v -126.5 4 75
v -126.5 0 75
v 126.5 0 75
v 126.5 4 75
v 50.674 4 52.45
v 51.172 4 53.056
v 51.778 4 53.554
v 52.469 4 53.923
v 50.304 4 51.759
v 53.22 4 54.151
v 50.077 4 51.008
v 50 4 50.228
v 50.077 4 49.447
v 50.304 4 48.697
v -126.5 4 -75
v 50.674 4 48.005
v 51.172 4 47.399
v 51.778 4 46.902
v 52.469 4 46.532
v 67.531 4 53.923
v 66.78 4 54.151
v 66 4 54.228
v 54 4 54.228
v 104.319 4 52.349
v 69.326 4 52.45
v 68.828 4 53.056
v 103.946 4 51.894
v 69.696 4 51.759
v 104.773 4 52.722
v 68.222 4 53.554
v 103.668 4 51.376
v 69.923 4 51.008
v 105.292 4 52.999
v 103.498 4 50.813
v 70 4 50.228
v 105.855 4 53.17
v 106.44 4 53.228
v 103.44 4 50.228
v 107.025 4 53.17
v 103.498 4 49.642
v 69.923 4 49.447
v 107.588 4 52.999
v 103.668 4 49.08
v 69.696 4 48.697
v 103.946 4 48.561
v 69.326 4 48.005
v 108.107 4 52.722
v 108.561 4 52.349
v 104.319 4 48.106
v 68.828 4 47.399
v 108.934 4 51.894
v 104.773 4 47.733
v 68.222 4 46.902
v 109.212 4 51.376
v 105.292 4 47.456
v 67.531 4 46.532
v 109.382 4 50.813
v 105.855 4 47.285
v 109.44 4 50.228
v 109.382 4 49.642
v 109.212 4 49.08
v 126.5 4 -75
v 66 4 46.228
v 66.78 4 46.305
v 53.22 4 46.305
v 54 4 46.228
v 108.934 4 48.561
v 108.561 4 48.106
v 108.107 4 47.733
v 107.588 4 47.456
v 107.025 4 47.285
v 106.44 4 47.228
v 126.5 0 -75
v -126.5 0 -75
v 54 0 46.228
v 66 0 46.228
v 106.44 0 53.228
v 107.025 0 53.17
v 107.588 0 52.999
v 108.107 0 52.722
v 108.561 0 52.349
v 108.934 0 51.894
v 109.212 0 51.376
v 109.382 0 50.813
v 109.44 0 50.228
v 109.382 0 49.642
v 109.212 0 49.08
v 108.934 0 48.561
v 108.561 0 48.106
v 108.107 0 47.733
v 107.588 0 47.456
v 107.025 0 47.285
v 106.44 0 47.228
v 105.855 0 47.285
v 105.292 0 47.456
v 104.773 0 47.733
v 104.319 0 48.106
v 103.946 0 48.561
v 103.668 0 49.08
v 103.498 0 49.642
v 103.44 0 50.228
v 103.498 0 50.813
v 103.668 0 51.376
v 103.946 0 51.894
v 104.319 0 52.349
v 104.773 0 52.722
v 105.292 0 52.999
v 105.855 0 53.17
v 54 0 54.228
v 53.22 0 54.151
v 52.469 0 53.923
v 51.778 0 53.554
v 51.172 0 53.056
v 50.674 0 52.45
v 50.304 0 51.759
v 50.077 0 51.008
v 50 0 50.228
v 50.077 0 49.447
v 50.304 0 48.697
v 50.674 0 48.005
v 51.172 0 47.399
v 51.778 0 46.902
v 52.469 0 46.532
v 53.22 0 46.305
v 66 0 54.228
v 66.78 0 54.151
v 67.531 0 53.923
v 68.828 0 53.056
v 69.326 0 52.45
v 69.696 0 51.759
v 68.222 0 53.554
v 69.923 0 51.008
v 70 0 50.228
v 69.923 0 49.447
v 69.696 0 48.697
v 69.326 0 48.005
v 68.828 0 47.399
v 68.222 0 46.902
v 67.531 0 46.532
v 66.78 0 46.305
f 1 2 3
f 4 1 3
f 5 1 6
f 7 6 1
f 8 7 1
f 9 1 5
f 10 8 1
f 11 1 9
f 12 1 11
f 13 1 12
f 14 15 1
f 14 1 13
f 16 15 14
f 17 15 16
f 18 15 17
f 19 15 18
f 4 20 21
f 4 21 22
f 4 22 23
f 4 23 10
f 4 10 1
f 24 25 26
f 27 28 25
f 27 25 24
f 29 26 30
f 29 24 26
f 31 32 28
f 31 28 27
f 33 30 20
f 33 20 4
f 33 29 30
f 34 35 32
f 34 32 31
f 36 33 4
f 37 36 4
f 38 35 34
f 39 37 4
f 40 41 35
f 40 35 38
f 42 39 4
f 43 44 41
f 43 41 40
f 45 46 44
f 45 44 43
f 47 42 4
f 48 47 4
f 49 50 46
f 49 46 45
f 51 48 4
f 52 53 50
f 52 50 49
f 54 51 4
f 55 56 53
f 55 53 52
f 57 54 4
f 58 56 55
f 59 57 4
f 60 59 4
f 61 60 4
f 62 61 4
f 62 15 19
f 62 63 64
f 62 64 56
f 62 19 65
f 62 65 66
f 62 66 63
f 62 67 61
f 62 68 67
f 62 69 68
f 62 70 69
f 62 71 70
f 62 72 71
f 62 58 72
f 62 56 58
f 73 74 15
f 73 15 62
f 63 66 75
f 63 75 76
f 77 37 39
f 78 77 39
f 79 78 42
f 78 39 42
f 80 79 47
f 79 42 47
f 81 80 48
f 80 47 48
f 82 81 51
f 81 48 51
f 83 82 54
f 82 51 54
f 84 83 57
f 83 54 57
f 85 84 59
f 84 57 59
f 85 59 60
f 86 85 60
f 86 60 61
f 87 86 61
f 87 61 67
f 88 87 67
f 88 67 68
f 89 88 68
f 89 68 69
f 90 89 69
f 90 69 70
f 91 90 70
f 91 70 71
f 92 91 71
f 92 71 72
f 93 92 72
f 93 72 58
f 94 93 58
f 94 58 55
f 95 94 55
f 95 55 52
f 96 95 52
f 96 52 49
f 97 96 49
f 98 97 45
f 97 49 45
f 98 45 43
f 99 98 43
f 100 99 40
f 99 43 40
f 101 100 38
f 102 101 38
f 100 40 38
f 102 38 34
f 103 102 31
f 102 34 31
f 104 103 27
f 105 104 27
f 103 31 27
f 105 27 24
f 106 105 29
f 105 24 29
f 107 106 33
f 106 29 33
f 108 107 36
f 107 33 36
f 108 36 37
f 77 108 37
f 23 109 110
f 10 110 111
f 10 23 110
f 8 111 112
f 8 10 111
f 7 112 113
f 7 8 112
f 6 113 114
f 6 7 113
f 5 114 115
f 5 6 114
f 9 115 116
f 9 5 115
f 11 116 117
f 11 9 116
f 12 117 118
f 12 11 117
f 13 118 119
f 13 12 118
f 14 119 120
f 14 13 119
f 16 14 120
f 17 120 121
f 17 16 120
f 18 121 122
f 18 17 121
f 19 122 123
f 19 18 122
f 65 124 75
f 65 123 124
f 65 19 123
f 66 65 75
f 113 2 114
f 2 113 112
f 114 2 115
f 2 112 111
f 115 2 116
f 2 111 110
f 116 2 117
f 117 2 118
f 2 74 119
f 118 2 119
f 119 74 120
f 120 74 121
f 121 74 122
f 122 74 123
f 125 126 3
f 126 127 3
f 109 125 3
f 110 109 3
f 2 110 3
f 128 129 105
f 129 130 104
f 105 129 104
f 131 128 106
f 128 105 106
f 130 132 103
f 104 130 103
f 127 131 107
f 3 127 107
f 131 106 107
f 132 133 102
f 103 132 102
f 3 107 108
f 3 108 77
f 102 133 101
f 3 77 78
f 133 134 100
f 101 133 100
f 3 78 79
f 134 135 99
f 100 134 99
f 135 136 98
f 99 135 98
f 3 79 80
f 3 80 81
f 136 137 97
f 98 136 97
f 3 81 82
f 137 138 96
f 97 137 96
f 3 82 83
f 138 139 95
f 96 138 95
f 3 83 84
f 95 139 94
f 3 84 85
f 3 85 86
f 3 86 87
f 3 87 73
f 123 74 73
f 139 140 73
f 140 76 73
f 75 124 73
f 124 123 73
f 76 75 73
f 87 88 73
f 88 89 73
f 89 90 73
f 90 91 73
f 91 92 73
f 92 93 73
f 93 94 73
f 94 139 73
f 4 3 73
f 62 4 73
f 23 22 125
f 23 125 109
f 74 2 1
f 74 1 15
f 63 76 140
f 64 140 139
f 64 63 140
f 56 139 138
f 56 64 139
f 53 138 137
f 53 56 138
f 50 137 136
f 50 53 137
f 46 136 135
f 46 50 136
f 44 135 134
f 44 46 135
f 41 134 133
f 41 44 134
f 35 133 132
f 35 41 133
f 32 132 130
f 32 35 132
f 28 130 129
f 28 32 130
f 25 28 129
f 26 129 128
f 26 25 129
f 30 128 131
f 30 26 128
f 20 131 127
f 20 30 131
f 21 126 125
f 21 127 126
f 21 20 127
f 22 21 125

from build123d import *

# Parameters (mm, degrees)
SKETCH2_W           = 253
SKETCH2_H           = 150
BOSS_EXTRUDE1_DEPTH = 4
SKETCH3_R           = 3
CUT_EXTRUDE1_DEPTH  = 148.116450474


with BuildPart() as part:
    # Sketch2 → Boss-Extrude1 (new body)
    with BuildSketch(Plane(origin=(0, 0, 0), x_dir=(1, 0, 0), z_dir=(0, 1, 0))):
        Rectangle(SKETCH2_W, SKETCH2_H)
    extrude(amount=BOSS_EXTRUDE1_DEPTH)

    # Sketch3 → Cut-Extrude1 (cut, through all)
    with BuildSketch(Plane(origin=(0, 4, 0), x_dir=(1, 0, 0), z_dir=(0, 1, 0))):
        with Locations(Location((106.440039591, -50.227768214, 0), (0, 0, 270))):
            Circle(SKETCH3_R)
        with BuildLine():
            Line((66, -54.227768214), (54, -54.227768214))
            ThreePointArc((54, -54.227768214), (50, -50.227768214), (54, -46.227768214))
            Line((54, -46.227768214), (66, -46.227768214))
            ThreePointArc((66, -46.227768214), (70, -50.227768214), (66, -54.227768214))
        make_face()
    extrude(amount=-CUT_EXTRUDE1_DEPTH, mode=Mode.SUBTRACT)


solid = part.part
